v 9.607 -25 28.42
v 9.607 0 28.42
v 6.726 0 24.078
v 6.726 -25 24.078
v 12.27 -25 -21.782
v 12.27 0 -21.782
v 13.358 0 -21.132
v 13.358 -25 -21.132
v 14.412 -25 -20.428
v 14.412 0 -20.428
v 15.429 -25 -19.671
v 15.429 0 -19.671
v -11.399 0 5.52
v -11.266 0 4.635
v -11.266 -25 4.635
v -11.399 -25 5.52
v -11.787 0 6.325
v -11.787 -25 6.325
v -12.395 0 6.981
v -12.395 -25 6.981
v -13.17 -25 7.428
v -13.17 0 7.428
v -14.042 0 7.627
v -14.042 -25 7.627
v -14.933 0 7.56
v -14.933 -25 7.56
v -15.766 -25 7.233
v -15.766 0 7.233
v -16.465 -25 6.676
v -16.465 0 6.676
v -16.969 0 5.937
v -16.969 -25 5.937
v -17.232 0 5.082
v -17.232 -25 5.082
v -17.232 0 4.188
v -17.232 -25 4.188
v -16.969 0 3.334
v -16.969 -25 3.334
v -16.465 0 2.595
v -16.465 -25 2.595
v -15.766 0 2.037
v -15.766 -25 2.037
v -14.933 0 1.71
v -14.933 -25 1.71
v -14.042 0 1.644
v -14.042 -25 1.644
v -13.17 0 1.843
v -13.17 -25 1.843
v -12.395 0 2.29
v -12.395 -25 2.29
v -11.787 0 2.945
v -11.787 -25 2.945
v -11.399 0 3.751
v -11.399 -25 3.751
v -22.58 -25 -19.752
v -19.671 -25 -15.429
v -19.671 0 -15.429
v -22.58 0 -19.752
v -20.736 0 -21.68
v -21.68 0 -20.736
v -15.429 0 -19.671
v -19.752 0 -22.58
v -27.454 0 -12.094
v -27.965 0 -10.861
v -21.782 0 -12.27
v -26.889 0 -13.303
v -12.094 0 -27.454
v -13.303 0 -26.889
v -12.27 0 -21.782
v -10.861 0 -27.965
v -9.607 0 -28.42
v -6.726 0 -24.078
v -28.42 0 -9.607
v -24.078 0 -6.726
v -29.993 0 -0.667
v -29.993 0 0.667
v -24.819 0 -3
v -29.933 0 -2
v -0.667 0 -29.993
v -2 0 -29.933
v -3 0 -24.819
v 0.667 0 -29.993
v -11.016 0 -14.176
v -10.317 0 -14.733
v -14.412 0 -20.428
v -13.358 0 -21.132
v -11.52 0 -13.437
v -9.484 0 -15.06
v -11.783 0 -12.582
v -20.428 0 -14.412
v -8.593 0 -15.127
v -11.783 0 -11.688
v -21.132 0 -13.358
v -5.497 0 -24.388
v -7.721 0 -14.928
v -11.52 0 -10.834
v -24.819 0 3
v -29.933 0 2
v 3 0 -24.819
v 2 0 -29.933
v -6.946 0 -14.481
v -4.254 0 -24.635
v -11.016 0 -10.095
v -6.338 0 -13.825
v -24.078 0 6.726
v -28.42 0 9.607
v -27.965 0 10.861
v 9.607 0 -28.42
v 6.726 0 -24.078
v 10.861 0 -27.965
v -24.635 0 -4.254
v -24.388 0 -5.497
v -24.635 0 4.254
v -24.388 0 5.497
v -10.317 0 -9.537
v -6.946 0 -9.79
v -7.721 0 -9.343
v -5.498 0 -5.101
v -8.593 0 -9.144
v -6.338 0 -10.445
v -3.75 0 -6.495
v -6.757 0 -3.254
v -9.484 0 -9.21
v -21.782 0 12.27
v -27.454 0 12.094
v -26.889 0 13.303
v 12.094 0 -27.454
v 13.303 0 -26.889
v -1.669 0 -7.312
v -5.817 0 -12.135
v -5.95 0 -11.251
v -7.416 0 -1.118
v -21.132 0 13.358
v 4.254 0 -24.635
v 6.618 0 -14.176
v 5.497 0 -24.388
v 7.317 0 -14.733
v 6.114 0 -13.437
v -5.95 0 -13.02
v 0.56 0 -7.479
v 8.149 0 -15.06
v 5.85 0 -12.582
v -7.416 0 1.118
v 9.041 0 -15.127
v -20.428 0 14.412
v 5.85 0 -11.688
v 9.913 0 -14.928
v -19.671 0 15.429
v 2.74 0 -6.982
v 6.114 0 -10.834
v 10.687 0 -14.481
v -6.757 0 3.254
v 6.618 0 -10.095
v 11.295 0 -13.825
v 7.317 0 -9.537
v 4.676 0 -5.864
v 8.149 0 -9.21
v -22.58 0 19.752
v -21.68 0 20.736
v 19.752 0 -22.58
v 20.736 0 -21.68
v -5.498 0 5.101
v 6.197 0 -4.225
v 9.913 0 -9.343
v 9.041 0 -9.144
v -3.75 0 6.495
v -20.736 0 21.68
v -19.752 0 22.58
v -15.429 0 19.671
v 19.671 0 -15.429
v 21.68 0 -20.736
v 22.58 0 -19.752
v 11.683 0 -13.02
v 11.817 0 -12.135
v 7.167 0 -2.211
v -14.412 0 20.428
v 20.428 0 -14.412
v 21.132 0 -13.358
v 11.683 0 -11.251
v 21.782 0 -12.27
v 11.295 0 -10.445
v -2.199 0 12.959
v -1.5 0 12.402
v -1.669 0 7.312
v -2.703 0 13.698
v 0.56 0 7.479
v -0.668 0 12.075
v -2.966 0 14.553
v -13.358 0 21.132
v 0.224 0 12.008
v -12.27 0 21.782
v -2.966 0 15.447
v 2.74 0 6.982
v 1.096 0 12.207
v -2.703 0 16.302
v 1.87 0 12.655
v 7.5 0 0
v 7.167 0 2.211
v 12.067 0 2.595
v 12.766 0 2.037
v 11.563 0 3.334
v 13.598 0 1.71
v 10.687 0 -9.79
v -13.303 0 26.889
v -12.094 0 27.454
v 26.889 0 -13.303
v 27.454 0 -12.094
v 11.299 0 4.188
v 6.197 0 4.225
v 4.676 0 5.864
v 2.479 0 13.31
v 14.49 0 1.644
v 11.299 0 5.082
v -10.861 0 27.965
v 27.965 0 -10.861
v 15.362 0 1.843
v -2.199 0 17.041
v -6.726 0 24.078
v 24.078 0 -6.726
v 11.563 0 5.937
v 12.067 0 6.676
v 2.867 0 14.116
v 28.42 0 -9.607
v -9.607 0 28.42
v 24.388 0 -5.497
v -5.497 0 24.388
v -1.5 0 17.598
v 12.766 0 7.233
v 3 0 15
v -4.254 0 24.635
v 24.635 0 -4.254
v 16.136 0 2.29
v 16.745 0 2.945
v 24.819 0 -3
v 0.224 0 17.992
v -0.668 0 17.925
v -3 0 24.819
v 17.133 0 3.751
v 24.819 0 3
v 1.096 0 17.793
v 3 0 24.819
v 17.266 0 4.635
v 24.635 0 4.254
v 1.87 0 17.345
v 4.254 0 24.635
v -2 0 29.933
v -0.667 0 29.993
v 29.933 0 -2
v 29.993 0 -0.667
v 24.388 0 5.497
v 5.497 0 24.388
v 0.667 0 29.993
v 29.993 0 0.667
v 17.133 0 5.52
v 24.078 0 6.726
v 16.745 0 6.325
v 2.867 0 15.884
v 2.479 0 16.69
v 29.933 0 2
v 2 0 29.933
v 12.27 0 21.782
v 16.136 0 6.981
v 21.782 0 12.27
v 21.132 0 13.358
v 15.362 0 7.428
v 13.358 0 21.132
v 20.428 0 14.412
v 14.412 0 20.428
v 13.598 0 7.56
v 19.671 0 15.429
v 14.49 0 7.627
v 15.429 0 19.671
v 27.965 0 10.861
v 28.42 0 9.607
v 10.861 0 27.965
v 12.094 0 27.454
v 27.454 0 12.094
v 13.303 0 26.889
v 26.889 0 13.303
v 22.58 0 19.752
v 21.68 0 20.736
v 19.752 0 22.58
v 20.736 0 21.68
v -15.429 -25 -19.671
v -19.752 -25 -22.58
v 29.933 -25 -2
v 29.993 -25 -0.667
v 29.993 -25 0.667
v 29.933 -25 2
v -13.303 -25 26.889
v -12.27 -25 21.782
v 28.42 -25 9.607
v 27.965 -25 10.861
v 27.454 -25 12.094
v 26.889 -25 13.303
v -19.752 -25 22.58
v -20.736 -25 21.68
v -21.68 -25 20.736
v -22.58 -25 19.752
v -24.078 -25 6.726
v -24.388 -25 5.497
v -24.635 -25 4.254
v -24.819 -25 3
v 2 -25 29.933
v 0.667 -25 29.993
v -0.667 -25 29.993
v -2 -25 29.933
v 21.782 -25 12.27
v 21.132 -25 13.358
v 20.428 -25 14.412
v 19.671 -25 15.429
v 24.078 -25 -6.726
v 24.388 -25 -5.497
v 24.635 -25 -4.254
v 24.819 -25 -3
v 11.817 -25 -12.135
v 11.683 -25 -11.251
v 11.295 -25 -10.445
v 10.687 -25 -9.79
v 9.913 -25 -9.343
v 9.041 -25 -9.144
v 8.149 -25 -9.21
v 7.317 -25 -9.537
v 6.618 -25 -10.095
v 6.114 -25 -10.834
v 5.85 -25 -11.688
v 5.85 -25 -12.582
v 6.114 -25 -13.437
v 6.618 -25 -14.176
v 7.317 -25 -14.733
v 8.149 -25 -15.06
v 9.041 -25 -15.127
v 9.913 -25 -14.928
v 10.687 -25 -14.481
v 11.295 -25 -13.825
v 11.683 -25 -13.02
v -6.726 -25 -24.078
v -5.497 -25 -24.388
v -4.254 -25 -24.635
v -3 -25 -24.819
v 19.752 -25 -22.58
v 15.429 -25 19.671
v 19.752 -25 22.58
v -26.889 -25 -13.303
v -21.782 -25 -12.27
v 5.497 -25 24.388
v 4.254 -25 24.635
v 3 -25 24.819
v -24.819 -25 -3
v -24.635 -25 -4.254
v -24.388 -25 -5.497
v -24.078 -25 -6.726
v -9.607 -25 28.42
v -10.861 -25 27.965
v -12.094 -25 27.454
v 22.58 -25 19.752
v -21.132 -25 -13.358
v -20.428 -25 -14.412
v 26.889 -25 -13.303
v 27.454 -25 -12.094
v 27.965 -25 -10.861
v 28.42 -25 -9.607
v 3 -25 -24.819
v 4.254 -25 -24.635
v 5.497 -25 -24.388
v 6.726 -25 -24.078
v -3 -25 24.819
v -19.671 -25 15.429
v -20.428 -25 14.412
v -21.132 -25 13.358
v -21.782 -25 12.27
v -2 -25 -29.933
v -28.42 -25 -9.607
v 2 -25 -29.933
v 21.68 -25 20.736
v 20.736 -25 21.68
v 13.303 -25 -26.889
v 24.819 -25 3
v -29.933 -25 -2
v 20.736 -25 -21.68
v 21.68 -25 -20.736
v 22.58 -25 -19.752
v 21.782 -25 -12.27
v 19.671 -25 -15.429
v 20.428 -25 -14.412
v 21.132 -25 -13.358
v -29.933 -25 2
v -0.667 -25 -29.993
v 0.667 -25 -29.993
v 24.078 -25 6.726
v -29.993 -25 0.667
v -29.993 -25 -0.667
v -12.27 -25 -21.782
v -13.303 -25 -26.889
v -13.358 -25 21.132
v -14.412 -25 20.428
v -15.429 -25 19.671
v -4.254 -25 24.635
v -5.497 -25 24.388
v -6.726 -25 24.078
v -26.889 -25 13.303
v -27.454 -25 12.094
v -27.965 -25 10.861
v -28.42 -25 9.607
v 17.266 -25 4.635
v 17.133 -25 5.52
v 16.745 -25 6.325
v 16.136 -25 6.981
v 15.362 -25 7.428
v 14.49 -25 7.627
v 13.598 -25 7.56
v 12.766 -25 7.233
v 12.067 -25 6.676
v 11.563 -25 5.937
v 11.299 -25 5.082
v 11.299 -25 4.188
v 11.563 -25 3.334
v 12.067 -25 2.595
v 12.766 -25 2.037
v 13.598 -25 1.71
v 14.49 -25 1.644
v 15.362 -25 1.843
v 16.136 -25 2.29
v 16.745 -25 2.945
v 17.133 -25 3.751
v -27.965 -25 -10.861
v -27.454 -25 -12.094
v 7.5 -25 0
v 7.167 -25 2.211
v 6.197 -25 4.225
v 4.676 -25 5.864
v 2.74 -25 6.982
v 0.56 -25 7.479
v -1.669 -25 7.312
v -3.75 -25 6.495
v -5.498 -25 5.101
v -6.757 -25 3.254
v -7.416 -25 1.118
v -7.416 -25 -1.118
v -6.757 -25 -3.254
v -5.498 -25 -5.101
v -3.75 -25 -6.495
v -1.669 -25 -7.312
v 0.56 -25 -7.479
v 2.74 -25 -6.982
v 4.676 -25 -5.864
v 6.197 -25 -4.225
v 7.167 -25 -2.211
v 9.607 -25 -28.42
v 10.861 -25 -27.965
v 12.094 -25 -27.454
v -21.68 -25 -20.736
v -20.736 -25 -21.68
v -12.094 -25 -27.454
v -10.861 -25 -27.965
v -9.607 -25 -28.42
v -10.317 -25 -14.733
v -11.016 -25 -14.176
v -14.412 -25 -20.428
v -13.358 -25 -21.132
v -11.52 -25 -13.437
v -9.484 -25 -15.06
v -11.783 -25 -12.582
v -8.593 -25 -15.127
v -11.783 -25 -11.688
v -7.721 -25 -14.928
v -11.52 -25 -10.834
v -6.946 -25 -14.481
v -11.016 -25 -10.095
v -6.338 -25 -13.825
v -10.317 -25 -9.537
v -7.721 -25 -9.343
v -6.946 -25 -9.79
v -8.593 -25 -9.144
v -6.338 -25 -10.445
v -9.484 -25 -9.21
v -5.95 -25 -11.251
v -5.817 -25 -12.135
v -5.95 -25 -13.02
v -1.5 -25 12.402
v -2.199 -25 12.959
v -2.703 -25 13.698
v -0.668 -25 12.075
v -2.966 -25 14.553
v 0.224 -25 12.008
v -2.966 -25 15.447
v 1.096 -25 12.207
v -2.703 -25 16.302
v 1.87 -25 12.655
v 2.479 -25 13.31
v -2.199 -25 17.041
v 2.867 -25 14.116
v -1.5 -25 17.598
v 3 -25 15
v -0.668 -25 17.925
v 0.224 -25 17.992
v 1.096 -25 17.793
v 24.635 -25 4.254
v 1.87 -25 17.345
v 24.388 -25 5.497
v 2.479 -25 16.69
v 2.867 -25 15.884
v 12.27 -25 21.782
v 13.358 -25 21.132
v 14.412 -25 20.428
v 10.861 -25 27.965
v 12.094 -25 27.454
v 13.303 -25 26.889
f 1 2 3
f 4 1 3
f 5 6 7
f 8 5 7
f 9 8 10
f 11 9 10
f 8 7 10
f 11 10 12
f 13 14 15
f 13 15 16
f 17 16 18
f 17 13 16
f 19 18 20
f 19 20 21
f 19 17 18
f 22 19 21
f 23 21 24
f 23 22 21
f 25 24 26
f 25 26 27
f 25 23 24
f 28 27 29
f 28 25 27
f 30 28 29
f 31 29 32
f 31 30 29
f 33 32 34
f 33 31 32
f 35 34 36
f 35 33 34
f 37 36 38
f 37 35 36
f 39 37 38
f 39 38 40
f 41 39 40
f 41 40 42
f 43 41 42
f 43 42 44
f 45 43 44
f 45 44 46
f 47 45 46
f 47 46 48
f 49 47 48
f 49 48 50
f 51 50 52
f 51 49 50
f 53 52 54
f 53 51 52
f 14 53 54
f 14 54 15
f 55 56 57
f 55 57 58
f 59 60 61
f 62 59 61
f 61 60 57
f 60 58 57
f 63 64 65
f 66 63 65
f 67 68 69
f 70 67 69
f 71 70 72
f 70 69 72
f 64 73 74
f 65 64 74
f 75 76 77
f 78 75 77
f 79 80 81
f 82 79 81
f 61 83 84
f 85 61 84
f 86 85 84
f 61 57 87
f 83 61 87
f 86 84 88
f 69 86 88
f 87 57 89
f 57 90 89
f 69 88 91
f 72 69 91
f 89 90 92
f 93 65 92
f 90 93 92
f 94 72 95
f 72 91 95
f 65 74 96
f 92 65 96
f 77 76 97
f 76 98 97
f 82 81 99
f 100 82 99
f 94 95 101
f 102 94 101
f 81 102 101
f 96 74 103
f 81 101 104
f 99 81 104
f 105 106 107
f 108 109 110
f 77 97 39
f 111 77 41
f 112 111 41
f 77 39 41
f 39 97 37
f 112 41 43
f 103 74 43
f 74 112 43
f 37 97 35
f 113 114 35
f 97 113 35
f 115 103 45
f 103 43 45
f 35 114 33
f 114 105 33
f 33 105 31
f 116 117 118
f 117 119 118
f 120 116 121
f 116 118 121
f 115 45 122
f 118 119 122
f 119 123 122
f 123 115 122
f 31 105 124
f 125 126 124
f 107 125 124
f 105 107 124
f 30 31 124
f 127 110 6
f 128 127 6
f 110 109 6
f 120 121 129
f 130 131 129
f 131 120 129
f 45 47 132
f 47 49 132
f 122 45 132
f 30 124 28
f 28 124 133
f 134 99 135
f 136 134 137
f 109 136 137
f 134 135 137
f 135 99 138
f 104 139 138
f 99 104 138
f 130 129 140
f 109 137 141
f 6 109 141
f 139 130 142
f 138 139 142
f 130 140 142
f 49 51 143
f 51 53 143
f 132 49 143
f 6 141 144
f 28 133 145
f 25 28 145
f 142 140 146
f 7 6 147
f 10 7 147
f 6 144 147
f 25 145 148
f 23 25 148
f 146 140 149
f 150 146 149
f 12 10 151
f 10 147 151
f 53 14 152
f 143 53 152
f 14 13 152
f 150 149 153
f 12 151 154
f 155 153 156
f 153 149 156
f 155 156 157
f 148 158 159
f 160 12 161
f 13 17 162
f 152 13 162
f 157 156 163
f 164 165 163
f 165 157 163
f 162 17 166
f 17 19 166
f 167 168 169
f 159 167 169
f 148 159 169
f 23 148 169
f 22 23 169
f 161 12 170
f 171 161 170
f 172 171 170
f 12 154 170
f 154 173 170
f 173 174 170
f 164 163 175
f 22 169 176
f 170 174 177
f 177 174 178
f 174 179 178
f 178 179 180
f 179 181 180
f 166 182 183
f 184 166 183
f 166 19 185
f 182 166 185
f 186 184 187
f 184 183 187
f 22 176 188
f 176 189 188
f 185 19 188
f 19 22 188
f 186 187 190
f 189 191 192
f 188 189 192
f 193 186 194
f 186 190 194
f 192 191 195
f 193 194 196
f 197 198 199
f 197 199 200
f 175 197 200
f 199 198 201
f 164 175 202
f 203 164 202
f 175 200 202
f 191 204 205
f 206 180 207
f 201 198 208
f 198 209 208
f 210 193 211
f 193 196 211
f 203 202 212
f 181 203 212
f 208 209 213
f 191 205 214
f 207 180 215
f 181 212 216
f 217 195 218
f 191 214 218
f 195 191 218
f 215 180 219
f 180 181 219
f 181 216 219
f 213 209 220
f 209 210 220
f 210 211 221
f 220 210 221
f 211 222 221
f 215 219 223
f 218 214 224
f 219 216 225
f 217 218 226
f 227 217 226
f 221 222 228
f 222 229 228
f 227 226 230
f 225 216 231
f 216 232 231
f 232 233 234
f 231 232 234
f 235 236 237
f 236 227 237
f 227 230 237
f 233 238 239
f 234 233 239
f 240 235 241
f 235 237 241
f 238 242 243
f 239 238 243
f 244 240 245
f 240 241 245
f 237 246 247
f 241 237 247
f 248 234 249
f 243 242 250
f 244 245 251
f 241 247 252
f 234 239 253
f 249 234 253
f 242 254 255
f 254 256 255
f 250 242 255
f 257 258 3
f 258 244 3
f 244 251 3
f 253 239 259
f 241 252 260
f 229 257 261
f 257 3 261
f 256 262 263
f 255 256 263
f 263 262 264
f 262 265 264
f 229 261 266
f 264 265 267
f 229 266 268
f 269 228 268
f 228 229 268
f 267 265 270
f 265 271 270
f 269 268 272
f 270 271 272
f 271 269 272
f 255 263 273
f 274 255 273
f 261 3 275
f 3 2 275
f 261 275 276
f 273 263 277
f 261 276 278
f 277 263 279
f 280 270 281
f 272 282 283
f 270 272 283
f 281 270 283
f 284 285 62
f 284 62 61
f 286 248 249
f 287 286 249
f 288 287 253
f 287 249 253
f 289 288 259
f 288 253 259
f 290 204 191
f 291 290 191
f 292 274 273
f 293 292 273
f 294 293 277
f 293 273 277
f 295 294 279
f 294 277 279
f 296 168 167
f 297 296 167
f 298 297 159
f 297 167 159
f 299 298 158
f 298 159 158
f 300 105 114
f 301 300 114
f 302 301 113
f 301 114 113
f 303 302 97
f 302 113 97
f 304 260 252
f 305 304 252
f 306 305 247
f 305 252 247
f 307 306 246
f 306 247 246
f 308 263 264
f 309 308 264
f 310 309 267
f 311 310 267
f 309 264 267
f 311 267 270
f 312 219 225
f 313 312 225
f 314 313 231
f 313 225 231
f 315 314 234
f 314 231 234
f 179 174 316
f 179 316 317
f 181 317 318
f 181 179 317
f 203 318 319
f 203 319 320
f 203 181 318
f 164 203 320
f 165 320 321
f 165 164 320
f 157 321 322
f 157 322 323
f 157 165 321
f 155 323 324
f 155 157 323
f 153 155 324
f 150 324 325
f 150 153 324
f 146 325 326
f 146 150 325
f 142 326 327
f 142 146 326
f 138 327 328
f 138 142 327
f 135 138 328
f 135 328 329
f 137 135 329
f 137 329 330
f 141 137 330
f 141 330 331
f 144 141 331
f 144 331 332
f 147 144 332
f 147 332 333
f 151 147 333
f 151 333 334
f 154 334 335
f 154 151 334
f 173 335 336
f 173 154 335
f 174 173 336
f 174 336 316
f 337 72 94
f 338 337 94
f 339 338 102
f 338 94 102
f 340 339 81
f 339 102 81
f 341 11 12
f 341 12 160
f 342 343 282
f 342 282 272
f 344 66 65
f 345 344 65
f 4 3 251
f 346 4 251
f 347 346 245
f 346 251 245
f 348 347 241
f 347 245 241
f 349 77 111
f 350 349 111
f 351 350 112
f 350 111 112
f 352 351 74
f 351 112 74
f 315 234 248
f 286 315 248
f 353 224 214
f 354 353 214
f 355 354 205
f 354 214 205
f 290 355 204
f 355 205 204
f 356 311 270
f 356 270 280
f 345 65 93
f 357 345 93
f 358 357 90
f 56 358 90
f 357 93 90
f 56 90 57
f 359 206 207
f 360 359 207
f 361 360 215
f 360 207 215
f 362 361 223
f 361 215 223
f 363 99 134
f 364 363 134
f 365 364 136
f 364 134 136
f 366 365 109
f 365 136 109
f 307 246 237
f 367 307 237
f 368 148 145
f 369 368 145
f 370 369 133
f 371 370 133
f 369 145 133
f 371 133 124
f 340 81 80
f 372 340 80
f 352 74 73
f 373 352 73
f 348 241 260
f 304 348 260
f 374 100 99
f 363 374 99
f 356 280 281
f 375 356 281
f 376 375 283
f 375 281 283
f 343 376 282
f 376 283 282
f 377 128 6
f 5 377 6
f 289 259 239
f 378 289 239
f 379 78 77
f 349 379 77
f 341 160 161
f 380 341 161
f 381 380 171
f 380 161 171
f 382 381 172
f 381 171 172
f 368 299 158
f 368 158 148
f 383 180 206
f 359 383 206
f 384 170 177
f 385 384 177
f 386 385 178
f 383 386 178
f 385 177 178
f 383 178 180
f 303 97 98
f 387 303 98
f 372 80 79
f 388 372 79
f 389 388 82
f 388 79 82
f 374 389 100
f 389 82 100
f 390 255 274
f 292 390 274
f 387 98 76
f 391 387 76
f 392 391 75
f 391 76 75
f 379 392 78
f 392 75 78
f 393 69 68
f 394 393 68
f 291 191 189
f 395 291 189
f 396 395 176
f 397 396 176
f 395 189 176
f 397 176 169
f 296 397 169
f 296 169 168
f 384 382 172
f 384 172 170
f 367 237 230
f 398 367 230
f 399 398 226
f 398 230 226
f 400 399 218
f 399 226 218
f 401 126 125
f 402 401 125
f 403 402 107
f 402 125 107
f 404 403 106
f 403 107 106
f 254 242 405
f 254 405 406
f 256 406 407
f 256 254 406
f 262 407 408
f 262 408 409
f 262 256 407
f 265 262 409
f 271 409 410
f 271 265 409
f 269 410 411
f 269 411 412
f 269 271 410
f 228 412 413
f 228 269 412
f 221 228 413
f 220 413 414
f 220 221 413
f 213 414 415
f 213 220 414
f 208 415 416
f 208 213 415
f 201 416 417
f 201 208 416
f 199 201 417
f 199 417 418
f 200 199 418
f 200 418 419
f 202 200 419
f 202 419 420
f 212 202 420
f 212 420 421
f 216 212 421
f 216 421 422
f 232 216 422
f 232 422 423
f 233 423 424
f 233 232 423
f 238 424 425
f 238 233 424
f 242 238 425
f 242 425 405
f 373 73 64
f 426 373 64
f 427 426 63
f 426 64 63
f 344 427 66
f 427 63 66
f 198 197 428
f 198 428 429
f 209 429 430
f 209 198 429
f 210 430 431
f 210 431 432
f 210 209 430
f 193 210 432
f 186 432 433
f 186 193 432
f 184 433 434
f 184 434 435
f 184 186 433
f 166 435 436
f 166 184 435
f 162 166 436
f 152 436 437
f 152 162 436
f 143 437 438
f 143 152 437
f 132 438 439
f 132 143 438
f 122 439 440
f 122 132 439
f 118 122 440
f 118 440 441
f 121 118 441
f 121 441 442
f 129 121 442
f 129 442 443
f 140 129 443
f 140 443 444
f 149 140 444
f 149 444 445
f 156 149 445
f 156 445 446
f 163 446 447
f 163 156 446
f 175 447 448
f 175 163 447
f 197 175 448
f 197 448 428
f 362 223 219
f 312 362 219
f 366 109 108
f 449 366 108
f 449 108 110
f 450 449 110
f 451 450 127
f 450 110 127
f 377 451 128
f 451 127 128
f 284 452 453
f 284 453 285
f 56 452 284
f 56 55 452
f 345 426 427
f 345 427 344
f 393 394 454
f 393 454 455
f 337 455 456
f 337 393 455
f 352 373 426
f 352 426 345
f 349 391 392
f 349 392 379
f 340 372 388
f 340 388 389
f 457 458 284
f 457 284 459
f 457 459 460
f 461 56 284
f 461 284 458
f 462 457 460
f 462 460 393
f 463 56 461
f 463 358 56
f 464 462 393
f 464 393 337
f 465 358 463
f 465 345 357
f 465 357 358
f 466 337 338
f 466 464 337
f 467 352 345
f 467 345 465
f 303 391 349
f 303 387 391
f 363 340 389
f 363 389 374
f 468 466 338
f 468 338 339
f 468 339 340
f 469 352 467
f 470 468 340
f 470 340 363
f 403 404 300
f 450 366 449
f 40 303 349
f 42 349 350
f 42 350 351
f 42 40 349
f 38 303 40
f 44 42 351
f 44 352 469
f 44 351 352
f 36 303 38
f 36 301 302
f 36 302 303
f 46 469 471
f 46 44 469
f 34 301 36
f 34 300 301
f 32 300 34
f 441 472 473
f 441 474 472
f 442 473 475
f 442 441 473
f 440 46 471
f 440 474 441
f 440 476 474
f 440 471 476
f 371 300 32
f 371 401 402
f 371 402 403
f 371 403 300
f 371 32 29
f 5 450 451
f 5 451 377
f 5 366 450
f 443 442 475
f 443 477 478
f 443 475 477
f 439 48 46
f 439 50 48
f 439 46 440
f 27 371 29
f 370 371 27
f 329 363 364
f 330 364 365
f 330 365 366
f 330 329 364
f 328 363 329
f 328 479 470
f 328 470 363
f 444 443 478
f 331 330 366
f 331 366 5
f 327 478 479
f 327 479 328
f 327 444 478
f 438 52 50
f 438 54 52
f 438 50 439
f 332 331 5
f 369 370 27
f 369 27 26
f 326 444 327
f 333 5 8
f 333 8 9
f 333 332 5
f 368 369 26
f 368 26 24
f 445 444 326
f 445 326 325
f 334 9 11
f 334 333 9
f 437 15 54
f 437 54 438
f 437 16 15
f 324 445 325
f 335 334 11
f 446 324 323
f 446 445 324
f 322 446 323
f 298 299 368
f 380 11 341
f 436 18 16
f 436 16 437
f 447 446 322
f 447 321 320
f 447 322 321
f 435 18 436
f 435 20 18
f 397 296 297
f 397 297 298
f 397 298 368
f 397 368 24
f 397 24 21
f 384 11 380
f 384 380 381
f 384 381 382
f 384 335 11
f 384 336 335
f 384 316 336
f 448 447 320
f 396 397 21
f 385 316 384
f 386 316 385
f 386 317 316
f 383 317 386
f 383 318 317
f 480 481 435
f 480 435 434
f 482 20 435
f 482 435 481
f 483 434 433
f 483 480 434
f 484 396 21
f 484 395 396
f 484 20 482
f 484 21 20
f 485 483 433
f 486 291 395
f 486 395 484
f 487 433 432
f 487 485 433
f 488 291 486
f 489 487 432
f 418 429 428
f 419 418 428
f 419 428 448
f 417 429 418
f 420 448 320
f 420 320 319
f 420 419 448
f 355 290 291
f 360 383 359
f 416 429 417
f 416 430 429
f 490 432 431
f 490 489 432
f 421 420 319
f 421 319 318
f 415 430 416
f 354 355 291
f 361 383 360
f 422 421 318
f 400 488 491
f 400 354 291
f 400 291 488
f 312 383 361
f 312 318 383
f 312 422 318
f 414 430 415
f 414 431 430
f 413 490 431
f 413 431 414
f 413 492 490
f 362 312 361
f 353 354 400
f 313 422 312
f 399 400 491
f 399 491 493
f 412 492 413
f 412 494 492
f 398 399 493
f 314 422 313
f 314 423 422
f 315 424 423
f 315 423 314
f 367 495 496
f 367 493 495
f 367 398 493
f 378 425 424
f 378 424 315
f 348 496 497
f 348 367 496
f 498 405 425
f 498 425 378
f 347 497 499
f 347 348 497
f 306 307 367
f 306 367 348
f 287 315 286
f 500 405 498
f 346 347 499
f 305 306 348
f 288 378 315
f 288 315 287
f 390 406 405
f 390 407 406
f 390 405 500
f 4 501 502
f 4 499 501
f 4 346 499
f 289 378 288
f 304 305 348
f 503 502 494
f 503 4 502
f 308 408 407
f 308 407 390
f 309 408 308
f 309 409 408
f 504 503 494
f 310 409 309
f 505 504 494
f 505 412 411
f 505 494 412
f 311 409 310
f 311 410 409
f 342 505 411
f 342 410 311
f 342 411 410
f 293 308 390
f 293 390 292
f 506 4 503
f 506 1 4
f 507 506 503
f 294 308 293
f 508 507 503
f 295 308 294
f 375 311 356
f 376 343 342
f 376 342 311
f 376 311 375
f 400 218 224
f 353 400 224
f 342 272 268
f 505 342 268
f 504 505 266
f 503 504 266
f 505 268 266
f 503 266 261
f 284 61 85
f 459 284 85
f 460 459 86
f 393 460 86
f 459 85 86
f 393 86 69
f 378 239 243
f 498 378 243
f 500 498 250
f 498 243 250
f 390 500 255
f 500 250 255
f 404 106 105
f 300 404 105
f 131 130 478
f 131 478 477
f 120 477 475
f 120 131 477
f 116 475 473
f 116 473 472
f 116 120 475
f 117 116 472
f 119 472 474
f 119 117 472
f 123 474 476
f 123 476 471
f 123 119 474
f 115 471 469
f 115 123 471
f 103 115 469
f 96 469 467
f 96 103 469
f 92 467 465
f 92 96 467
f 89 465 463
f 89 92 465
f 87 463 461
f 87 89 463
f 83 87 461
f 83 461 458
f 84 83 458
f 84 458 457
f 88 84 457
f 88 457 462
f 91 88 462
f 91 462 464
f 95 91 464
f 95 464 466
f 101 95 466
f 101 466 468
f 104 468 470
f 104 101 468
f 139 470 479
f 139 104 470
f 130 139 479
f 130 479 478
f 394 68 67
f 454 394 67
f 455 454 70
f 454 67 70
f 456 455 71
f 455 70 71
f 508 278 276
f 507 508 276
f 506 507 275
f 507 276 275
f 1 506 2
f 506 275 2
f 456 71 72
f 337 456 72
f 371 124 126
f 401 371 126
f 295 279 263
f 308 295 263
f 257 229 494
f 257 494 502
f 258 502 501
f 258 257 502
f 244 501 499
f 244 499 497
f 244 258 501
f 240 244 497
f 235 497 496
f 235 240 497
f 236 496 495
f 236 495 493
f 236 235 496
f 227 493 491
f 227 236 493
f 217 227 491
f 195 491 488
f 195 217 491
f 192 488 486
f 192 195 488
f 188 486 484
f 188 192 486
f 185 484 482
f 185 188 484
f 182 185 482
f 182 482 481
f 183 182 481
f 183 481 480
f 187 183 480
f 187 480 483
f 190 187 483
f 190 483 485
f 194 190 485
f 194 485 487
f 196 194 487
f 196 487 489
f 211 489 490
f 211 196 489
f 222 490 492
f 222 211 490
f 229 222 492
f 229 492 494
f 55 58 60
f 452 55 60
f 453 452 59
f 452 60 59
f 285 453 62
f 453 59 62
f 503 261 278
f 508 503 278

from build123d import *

# Parameters (mm, degrees)
F0_R     = 3
F0_R_2   = 7.5
F1_DEPTH = 25


with BuildPart() as f1:
    # F0 (on Front) → F1 (new body)
    with BuildSketch(Plane.XZ):
        with BuildLine():
            ThreePointArc((24.819347, -3), (24.954796, -1.502717), (25, 0))
            ThreePointArc((25, 0), (24.954796, 1.502717), (24.819347, 3))
            ThreePointArc((24.819347, 3), (24.519632, 4.877258), (24.078137, 6.726314))
            ThreePointArc((24.078137, 6.726314), (23.096988, 9.567086), (21.782037, 12.269592))
            ThreePointArc((21.782037, 12.269592), (20.78674, 13.889256), (19.671249, 15.428608))
            ThreePointArc((19.671249, 15.428608), (17.67767, 17.67767), (15.428608, 19.671249))
            ThreePointArc((15.428608, 19.671249), (13.889256, 20.78674), (12.269592, 21.782037))
            ThreePointArc((12.269592, 21.782037), (9.567086, 23.096988), (6.726314, 24.078137))
            ThreePointArc((6.726314, 24.078137), (4.877258, 24.519632), (3, 24.819347))
            ThreePointArc((3, 24.819347), (0, 25), (-3, 24.819347))
            ThreePointArc((-3, 24.819347), (-4.877258, 24.519632), (-6.726314, 24.078137))
            ThreePointArc((-6.726314, 24.078137), (-9.567086, 23.096988), (-12.269592, 21.782037))
            ThreePointArc((-12.269592, 21.782037), (-13.889256, 20.78674), (-15.428608, 19.671249))
            ThreePointArc((-15.428608, 19.671249), (-17.67767, 17.67767), (-19.671249, 15.428608))
            ThreePointArc((-19.671249, 15.428608), (-20.78674, 13.889256), (-21.782037, 12.269592))
            ThreePointArc((-21.782037, 12.269592), (-23.096988, 9.567086), (-24.078137, 6.726314))
            ThreePointArc((-24.078137, 6.726314), (-24.519632, 4.877258), (-24.819347, 3))
            ThreePointArc((-24.819347, 3), (-25, 0), (-24.819347, -3))
            ThreePointArc((-24.819347, -3), (-24.519632, -4.877258), (-24.078137, -6.726314))
            ThreePointArc((-24.078137, -6.726314), (-23.096988, -9.567086), (-21.782037, -12.269592))
            ThreePointArc((-21.782037, -12.269592), (-20.78674, -13.889256), (-19.671249, -15.428608))
            ThreePointArc((-19.671249, -15.428608), (-17.67767, -17.67767), (-15.428608, -19.671249))
            ThreePointArc((-15.428608, -19.671249), (-13.889256, -20.78674), (-12.269592, -21.782037))
            ThreePointArc((-12.269592, -21.782037), (-9.567086, -23.096988), (-6.726314, -24.078137))
            ThreePointArc((-6.726314, -24.078137), (-4.877258, -24.519632), (-3, -24.819347))
            ThreePointArc((-3, -24.819347), (0, -25), (3, -24.819347))
            ThreePointArc((3, -24.819347), (4.877258, -24.519632), (6.726314, -24.078137))
            ThreePointArc((6.726314, -24.078137), (9.567086, -23.096988), (12.269592, -21.782037))
            ThreePointArc((12.269592, -21.782037), (13.889256, -20.78674), (15.428608, -19.671249))
            ThreePointArc((15.428608, -19.671249), (17.67767, -17.67767), (19.671249, -15.428608))
            ThreePointArc((19.671249, -15.428608), (20.78674, -13.889256), (21.782037, -12.269592))
            ThreePointArc((21.782037, -12.269592), (23.096988, -9.567086), (24.078137, -6.726314))
            ThreePointArc((24.078137, -6.726314), (24.519632, -4.877258), (24.819347, -3))
        make_face()
        with Locations((-8.816779, -12.135255)):
            Circle(F0_R, mode=Mode.SUBTRACT)
        with Locations((8.816779, -12.135255)):
            Circle(F0_R, mode=Mode.SUBTRACT)
        with Locations((-14.265848, 4.635255)):
            Circle(F0_R, mode=Mode.SUBTRACT)
        Circle(F0_R_2, mode=Mode.SUBTRACT)
        with Locations((14.265848, 4.635255)):
            Circle(F0_R, mode=Mode.SUBTRACT)
        with Locations((0, 15)):
            Circle(F0_R, mode=Mode.SUBTRACT)
        with BuildLine():
            ThreePointArc((24.819347, 3), (24.954796, 1.502717), (25, 0))
            ThreePointArc((25, 0), (24.954796, -1.502717), (24.819347, -3))
            Line((24.819347, -3), (29.933259, -2))
            ThreePointArc((29.933259, -2), (30, 0), (29.933259, 2))
            Line((29.933259, 2), (24.819347, 3))
        make_face()
        with BuildLine():
            ThreePointArc((21.782037, 12.269592), (23.096988, 9.567086), (24.078137, 6.726314))
            Line((24.078137, 6.726314), (28.420092, 9.607203))
            ThreePointArc((28.420092, 9.607203), (27.716386, 11.480503), (26.889359, 13.302721))
            Line((26.889359, 13.302721), (21.782037, 12.269592))
        make_face()
        with BuildLine():
            Line((28.420092, -9.607203), (24.078137, -6.726314))
            ThreePointArc((24.078137, -6.726314), (23.096988, -9.567086), (21.782037, -12.269592))
            Line((21.782037, -12.269592), (26.889359, -13.302721))
            ThreePointArc((26.889359, -13.302721), (27.716386, -11.480503), (28.420092, -9.607203))
        make_face()
        with BuildLine():
            ThreePointArc((15.428608, 19.671249), (17.67767, 17.67767), (19.671249, 15.428608))
            Line((19.671249, 15.428608), (22.580224, 19.751797))
            ThreePointArc((22.580224, 19.751797), (21.213203, 21.213203), (19.751797, 22.580224))
            Line((19.751797, 22.580224), (15.428608, 19.671249))
        make_face()
        with BuildLine():
            Line((22.580224, -19.751797), (19.671249, -15.428608))
            ThreePointArc((19.671249, -15.428608), (17.67767, -17.67767), (15.428608, -19.671249))
            Line((15.428608, -19.671249), (19.751797, -22.580224))
            ThreePointArc((19.751797, -22.580224), (21.213203, -21.213203), (22.580224, -19.751797))
        make_face()
        with BuildLine():
            ThreePointArc((6.726314, 24.078137), (9.567086, 23.096988), (12.269592, 21.782037))
            Line((12.269592, 21.782037), (13.302721, 26.889359))
            ThreePointArc((13.302721, 26.889359), (11.480503, 27.716386), (9.607203, 28.420092))
            Line((9.607203, 28.420092), (6.726314, 24.078137))
        make_face()
        with BuildLine():
            Line((13.302721, -26.889359), (12.269592, -21.782037))
            ThreePointArc((12.269592, -21.782037), (9.567086, -23.096988), (6.726314, -24.078137))
            Line((6.726314, -24.078137), (9.607203, -28.420092))
            ThreePointArc((9.607203, -28.420092), (11.480503, -27.716386), (13.302721, -26.889359))
        make_face()
        with BuildLine():
            ThreePointArc((-3, 24.819347), (0, 25), (3, 24.819347))
            Line((3, 24.819347), (2, 29.933259))
            ThreePointArc((2, 29.933259), (0, 30), (-2, 29.933259))
            Line((-2, 29.933259), (-3, 24.819347))
        make_face()
        with BuildLine():
            Line((2, -29.933259), (3, -24.819347))
            ThreePointArc((3, -24.819347), (0, -25), (-3, -24.819347))
            Line((-3, -24.819347), (-2, -29.933259))
            ThreePointArc((-2, -29.933259), (0, -30), (2, -29.933259))
        make_face()
        with BuildLine():
            ThreePointArc((-12.269592, 21.782037), (-9.567086, 23.096988), (-6.726314, 24.078137))
            Line((-6.726314, 24.078137), (-9.607203, 28.420092))
            ThreePointArc((-9.607203, 28.420092), (-11.480503, 27.716386), (-13.302721, 26.889359))
            Line((-13.302721, 26.889359), (-12.269592, 21.782037))
        make_face()
        with BuildLine():
            Line((-9.607203, -28.420092), (-6.726314, -24.078137))
            ThreePointArc((-6.726314, -24.078137), (-9.567086, -23.096988), (-12.269592, -21.782037))
            Line((-12.269592, -21.782037), (-13.302721, -26.889359))
            ThreePointArc((-13.302721, -26.889359), (-11.480503, -27.716386), (-9.607203, -28.420092))
        make_face()
        with BuildLine():
            ThreePointArc((-19.671249, 15.428608), (-17.67767, 17.67767), (-15.428608, 19.671249))
            Line((-15.428608, 19.671249), (-19.751797, 22.580224))
            ThreePointArc((-19.751797, 22.580224), (-21.213203, 21.213203), (-22.580224, 19.751797))
            Line((-22.580224, 19.751797), (-19.671249, 15.428608))
        make_face()
        with BuildLine():
            Line((-19.751797, -22.580224), (-15.428608, -19.671249))
            ThreePointArc((-15.428608, -19.671249), (-17.67767, -17.67767), (-19.671249, -15.428608))
            Line((-19.671249, -15.428608), (-22.580224, -19.751797))
            ThreePointArc((-22.580224, -19.751797), (-21.213203, -21.213203), (-19.751797, -22.580224))
        make_face()
        with BuildLine():
            ThreePointArc((-24.078137, 6.726314), (-23.096988, 9.567086), (-21.782037, 12.269592))
            Line((-21.782037, 12.269592), (-26.889359, 13.302721))
            ThreePointArc((-26.889359, 13.302721), (-27.716386, 11.480503), (-28.420092, 9.607203))
            Line((-28.420092, 9.607203), (-24.078137, 6.726314))
        make_face()
        with BuildLine():
            Line((-26.889359, -13.302721), (-21.782037, -12.269592))
            ThreePointArc((-21.782037, -12.269592), (-23.096988, -9.567086), (-24.078137, -6.726314))
            Line((-24.078137, -6.726314), (-28.420092, -9.607203))
            ThreePointArc((-28.420092, -9.607203), (-27.716386, -11.480503), (-26.889359, -13.302721))
        make_face()
        with BuildLine():
            ThreePointArc((-24.819347, -3), (-25, 0), (-24.819347, 3))
            Line((-24.819347, 3), (-29.933259, 2))
            ThreePointArc((-29.933259, 2), (-30, 0), (-29.933259, -2))
            Line((-29.933259, -2), (-24.819347, -3))
        make_face()
    extrude(amount=F1_DEPTH)


solid = f1.part
